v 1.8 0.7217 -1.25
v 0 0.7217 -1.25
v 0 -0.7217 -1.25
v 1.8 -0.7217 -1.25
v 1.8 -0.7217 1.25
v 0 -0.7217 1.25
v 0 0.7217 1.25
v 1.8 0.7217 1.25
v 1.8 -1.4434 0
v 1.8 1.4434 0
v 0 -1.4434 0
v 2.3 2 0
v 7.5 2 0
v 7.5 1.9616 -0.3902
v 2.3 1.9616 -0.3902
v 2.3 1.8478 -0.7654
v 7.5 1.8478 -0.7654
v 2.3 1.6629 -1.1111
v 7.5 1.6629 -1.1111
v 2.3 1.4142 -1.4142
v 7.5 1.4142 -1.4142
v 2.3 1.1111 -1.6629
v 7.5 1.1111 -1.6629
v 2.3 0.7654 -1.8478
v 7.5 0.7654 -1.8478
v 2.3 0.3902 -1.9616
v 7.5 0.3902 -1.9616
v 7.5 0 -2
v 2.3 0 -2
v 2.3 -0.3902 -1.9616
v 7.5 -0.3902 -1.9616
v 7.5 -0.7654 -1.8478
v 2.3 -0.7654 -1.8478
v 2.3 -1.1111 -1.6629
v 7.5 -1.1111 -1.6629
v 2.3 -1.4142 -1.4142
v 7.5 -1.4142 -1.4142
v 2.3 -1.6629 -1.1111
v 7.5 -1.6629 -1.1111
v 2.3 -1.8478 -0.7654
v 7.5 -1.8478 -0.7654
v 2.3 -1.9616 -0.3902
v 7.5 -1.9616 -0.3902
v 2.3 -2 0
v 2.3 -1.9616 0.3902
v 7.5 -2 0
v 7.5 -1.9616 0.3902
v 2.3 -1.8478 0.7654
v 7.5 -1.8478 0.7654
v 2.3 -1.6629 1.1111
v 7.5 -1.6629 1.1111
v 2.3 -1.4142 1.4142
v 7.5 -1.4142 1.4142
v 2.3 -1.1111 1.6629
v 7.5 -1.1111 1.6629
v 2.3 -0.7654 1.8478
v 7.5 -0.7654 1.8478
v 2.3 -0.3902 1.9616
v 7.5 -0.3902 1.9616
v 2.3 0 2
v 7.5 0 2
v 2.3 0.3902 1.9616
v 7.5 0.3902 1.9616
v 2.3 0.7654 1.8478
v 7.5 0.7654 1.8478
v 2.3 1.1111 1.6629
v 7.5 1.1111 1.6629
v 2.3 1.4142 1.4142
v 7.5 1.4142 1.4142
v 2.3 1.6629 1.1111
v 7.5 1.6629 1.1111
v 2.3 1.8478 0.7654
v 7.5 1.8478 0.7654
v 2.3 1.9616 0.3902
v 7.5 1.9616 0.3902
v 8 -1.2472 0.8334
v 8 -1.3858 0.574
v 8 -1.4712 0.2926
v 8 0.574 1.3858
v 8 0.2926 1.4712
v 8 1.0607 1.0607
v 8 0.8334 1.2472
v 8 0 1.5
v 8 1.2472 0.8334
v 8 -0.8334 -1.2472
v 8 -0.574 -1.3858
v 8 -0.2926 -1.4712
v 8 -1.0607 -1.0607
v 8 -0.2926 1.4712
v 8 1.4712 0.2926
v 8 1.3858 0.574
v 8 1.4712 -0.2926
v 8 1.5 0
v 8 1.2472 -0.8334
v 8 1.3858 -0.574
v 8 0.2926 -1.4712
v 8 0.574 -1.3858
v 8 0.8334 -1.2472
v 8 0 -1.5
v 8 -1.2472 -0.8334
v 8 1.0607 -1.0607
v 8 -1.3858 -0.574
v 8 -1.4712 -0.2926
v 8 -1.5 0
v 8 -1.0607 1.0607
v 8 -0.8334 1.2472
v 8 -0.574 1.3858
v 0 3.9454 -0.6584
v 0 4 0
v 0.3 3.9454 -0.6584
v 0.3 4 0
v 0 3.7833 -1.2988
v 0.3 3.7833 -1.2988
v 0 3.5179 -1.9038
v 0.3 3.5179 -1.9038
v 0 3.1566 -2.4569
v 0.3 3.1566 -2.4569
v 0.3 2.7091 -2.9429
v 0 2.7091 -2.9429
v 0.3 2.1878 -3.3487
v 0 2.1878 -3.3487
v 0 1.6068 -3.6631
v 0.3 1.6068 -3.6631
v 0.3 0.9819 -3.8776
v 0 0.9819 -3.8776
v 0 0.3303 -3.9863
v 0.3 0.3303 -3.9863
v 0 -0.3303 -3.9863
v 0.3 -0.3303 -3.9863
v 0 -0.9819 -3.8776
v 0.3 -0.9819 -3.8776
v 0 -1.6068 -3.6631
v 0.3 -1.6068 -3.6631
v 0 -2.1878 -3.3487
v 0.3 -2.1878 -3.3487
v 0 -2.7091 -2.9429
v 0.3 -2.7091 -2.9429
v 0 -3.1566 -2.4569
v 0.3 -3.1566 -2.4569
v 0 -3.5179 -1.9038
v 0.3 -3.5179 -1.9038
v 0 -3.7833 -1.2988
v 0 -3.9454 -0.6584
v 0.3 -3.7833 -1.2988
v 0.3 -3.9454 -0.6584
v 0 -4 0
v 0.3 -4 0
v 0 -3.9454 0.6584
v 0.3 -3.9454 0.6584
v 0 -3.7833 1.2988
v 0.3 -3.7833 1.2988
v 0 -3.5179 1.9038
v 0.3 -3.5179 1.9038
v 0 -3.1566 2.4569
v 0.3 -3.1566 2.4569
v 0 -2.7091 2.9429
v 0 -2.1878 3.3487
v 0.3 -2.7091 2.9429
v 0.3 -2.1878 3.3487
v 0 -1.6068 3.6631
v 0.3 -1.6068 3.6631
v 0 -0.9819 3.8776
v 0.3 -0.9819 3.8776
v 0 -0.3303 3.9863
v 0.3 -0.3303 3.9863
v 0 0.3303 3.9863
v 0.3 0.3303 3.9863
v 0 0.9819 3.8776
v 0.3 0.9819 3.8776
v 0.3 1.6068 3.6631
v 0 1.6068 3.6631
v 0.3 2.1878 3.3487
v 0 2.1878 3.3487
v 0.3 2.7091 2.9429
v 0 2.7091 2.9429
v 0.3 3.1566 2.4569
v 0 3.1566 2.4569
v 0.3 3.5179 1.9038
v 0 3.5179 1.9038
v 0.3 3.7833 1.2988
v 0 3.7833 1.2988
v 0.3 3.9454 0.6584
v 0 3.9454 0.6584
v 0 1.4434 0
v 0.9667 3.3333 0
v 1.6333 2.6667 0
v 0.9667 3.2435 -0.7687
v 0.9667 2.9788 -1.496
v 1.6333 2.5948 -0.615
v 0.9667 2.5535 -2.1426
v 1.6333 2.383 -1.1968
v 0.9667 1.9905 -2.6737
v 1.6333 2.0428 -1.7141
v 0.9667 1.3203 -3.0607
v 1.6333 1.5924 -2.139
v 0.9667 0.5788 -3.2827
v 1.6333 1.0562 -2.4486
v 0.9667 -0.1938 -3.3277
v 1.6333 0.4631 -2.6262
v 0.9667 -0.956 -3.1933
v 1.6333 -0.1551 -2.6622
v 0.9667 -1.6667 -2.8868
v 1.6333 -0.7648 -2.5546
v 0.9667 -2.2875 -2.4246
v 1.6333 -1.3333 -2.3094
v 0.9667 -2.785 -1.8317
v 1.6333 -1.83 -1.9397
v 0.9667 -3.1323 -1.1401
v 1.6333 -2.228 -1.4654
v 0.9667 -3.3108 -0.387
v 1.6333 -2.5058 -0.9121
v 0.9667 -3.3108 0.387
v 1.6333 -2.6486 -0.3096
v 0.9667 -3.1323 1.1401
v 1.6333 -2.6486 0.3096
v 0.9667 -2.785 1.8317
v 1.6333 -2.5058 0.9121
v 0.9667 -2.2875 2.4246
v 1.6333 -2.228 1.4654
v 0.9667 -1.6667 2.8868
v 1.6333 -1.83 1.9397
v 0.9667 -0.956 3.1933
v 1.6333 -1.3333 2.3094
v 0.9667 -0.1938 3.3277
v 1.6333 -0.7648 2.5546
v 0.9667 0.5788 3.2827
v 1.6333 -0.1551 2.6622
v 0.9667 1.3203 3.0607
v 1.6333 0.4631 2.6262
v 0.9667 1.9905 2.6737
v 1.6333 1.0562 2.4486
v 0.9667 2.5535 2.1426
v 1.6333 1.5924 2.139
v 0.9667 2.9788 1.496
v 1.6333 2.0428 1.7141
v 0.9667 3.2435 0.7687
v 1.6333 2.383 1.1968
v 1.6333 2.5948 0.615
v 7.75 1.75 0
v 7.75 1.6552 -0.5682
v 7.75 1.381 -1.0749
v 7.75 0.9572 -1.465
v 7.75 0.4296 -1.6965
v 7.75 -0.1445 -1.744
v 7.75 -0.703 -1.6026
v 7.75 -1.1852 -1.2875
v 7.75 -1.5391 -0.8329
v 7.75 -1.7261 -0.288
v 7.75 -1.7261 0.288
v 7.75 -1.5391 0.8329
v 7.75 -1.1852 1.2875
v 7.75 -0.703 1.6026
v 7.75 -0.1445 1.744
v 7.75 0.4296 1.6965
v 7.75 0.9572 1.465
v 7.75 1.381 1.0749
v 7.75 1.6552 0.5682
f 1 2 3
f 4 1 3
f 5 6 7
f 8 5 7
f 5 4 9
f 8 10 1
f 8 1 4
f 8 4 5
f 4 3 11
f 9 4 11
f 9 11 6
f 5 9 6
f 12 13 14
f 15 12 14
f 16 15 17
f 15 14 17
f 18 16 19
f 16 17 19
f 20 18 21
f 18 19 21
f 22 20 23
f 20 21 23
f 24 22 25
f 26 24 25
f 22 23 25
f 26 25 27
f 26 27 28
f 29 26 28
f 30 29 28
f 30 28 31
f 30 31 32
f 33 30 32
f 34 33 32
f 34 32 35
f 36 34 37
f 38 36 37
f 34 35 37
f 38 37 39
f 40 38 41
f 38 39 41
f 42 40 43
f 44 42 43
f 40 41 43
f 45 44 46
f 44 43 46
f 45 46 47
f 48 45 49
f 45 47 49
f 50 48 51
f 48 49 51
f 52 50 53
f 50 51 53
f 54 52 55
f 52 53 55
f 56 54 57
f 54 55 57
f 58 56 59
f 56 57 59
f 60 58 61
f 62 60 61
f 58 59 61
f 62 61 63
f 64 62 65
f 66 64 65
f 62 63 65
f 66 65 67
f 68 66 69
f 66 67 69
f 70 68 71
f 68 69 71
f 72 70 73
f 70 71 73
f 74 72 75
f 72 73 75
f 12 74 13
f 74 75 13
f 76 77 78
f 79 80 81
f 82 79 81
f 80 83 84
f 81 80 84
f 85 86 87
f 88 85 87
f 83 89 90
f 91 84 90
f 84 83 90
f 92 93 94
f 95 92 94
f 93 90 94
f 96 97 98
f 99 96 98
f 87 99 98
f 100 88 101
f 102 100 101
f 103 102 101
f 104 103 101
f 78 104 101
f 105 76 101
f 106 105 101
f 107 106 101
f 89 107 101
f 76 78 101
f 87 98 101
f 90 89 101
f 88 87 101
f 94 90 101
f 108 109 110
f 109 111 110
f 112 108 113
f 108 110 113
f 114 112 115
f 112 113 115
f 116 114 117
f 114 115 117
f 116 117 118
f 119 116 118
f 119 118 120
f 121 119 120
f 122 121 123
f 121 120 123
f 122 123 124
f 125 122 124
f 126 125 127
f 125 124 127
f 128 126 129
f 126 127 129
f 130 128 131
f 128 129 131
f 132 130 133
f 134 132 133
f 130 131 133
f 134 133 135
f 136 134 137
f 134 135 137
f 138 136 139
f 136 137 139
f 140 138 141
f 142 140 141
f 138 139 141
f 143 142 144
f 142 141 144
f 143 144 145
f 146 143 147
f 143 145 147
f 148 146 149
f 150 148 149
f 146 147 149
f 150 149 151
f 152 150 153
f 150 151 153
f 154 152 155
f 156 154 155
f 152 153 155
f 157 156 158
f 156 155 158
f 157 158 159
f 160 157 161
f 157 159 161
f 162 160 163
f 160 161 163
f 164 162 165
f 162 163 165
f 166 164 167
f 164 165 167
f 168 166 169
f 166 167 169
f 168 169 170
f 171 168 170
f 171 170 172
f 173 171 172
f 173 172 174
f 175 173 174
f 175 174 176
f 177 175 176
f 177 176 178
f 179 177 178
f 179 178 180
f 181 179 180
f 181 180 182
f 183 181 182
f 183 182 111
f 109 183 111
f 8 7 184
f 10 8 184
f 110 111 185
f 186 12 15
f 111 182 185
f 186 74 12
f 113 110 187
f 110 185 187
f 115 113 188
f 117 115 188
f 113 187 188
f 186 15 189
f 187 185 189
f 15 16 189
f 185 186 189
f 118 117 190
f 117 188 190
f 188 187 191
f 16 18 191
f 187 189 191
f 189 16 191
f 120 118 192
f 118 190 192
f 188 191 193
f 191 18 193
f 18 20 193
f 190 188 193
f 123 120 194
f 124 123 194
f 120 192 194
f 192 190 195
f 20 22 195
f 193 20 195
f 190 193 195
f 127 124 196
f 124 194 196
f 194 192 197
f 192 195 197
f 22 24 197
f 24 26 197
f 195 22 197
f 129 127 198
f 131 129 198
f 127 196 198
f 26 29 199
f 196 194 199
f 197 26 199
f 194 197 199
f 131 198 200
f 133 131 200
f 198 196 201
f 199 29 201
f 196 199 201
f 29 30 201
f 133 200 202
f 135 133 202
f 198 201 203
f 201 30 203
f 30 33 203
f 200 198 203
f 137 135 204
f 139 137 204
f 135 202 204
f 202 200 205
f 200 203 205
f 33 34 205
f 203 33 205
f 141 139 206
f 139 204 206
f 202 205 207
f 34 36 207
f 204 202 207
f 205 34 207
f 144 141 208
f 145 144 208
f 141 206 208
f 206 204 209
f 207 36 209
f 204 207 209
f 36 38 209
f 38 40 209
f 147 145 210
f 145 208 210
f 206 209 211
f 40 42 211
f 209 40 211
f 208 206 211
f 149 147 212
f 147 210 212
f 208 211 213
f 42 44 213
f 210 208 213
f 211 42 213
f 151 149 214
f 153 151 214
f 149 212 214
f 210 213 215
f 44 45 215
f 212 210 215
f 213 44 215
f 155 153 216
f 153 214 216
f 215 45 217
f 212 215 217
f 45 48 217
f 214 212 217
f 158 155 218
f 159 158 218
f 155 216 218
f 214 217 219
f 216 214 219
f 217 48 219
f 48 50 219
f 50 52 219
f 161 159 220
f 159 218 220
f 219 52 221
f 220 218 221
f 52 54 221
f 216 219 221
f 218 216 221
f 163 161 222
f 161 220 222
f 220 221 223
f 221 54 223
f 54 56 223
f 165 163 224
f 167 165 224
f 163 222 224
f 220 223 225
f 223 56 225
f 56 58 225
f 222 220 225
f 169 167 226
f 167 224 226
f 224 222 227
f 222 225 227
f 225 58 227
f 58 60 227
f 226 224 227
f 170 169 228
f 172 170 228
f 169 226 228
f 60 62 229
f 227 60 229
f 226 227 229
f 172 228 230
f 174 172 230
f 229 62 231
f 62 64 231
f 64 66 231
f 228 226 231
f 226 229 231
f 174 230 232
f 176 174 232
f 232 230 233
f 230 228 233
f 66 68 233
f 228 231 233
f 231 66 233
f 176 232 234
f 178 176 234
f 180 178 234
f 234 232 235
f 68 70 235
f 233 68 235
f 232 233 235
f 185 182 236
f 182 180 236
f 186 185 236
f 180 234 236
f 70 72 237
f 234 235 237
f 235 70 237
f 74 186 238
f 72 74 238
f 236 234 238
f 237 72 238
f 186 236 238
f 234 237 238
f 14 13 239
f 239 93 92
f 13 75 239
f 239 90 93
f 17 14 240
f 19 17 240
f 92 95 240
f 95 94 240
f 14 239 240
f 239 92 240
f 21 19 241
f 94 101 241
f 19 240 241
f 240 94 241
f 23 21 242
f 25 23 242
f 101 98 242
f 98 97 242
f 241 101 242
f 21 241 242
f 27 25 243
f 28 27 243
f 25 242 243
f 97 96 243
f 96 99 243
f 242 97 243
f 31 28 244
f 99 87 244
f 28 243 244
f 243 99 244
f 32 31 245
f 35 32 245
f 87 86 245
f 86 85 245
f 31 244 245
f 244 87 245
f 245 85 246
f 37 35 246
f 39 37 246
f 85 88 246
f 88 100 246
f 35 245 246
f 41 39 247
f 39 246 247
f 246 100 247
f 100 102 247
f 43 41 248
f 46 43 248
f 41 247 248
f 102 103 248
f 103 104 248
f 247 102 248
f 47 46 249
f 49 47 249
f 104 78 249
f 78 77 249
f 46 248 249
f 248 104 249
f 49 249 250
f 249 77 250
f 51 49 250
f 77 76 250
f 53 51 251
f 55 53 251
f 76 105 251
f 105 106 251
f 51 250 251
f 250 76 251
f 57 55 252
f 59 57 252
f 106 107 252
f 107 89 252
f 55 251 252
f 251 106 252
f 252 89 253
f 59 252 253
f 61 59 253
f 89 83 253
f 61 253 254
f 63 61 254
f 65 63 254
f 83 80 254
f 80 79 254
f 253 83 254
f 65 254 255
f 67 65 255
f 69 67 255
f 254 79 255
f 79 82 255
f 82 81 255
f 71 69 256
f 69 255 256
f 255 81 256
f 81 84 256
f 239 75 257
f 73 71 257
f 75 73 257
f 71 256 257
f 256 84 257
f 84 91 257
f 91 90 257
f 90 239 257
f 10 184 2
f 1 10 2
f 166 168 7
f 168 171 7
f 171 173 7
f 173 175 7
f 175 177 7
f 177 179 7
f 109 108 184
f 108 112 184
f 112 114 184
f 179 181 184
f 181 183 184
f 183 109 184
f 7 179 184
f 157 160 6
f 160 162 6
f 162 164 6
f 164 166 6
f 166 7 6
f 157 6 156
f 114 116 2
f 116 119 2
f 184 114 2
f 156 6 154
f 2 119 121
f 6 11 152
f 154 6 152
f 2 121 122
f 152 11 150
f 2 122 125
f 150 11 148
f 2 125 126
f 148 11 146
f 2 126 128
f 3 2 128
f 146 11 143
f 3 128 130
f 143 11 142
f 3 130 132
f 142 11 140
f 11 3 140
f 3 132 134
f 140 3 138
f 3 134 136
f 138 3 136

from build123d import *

# Parameters (mm, degrees)
CHANFREIN1_SIZE         = 0.5
ENL_V_MAT_EXTRU_1_DEPTH = 1.8


with BuildPart() as part:
    # Esquisse1 → Révolution1 (revolve)
    with BuildSketch(Plane.XY):
        Polygon((0, 0), (0, 4), (0.3, 4), (2.3, 2), (8, 2), (8, 0), align=None)
    revolve(axis=Axis((8, 0, 0), (-1, 0, 0)))

    # Chanfrein1
    chanfrein1_edges = [part.edges().sort_by_distance(p)[0] for p in [
        (8, -2, 0),
    ]]
    chamfer(chanfrein1_edges, length=CHANFREIN1_SIZE)

    # Esquisse2 → Enlèv. mat.-Extru.1 (cut)
    with BuildSketch(Plane.ZY):
        Polygon((0, 1.443375673), (-1.25, 0.721687836), (-1.25, -0.721687836), (0, -1.443375673), (1.25, -0.721687836), (1.25, 0.721687836), align=None)
    extrude(amount=-ENL_V_MAT_EXTRU_1_DEPTH, mode=Mode.SUBTRACT)


solid = part.part
